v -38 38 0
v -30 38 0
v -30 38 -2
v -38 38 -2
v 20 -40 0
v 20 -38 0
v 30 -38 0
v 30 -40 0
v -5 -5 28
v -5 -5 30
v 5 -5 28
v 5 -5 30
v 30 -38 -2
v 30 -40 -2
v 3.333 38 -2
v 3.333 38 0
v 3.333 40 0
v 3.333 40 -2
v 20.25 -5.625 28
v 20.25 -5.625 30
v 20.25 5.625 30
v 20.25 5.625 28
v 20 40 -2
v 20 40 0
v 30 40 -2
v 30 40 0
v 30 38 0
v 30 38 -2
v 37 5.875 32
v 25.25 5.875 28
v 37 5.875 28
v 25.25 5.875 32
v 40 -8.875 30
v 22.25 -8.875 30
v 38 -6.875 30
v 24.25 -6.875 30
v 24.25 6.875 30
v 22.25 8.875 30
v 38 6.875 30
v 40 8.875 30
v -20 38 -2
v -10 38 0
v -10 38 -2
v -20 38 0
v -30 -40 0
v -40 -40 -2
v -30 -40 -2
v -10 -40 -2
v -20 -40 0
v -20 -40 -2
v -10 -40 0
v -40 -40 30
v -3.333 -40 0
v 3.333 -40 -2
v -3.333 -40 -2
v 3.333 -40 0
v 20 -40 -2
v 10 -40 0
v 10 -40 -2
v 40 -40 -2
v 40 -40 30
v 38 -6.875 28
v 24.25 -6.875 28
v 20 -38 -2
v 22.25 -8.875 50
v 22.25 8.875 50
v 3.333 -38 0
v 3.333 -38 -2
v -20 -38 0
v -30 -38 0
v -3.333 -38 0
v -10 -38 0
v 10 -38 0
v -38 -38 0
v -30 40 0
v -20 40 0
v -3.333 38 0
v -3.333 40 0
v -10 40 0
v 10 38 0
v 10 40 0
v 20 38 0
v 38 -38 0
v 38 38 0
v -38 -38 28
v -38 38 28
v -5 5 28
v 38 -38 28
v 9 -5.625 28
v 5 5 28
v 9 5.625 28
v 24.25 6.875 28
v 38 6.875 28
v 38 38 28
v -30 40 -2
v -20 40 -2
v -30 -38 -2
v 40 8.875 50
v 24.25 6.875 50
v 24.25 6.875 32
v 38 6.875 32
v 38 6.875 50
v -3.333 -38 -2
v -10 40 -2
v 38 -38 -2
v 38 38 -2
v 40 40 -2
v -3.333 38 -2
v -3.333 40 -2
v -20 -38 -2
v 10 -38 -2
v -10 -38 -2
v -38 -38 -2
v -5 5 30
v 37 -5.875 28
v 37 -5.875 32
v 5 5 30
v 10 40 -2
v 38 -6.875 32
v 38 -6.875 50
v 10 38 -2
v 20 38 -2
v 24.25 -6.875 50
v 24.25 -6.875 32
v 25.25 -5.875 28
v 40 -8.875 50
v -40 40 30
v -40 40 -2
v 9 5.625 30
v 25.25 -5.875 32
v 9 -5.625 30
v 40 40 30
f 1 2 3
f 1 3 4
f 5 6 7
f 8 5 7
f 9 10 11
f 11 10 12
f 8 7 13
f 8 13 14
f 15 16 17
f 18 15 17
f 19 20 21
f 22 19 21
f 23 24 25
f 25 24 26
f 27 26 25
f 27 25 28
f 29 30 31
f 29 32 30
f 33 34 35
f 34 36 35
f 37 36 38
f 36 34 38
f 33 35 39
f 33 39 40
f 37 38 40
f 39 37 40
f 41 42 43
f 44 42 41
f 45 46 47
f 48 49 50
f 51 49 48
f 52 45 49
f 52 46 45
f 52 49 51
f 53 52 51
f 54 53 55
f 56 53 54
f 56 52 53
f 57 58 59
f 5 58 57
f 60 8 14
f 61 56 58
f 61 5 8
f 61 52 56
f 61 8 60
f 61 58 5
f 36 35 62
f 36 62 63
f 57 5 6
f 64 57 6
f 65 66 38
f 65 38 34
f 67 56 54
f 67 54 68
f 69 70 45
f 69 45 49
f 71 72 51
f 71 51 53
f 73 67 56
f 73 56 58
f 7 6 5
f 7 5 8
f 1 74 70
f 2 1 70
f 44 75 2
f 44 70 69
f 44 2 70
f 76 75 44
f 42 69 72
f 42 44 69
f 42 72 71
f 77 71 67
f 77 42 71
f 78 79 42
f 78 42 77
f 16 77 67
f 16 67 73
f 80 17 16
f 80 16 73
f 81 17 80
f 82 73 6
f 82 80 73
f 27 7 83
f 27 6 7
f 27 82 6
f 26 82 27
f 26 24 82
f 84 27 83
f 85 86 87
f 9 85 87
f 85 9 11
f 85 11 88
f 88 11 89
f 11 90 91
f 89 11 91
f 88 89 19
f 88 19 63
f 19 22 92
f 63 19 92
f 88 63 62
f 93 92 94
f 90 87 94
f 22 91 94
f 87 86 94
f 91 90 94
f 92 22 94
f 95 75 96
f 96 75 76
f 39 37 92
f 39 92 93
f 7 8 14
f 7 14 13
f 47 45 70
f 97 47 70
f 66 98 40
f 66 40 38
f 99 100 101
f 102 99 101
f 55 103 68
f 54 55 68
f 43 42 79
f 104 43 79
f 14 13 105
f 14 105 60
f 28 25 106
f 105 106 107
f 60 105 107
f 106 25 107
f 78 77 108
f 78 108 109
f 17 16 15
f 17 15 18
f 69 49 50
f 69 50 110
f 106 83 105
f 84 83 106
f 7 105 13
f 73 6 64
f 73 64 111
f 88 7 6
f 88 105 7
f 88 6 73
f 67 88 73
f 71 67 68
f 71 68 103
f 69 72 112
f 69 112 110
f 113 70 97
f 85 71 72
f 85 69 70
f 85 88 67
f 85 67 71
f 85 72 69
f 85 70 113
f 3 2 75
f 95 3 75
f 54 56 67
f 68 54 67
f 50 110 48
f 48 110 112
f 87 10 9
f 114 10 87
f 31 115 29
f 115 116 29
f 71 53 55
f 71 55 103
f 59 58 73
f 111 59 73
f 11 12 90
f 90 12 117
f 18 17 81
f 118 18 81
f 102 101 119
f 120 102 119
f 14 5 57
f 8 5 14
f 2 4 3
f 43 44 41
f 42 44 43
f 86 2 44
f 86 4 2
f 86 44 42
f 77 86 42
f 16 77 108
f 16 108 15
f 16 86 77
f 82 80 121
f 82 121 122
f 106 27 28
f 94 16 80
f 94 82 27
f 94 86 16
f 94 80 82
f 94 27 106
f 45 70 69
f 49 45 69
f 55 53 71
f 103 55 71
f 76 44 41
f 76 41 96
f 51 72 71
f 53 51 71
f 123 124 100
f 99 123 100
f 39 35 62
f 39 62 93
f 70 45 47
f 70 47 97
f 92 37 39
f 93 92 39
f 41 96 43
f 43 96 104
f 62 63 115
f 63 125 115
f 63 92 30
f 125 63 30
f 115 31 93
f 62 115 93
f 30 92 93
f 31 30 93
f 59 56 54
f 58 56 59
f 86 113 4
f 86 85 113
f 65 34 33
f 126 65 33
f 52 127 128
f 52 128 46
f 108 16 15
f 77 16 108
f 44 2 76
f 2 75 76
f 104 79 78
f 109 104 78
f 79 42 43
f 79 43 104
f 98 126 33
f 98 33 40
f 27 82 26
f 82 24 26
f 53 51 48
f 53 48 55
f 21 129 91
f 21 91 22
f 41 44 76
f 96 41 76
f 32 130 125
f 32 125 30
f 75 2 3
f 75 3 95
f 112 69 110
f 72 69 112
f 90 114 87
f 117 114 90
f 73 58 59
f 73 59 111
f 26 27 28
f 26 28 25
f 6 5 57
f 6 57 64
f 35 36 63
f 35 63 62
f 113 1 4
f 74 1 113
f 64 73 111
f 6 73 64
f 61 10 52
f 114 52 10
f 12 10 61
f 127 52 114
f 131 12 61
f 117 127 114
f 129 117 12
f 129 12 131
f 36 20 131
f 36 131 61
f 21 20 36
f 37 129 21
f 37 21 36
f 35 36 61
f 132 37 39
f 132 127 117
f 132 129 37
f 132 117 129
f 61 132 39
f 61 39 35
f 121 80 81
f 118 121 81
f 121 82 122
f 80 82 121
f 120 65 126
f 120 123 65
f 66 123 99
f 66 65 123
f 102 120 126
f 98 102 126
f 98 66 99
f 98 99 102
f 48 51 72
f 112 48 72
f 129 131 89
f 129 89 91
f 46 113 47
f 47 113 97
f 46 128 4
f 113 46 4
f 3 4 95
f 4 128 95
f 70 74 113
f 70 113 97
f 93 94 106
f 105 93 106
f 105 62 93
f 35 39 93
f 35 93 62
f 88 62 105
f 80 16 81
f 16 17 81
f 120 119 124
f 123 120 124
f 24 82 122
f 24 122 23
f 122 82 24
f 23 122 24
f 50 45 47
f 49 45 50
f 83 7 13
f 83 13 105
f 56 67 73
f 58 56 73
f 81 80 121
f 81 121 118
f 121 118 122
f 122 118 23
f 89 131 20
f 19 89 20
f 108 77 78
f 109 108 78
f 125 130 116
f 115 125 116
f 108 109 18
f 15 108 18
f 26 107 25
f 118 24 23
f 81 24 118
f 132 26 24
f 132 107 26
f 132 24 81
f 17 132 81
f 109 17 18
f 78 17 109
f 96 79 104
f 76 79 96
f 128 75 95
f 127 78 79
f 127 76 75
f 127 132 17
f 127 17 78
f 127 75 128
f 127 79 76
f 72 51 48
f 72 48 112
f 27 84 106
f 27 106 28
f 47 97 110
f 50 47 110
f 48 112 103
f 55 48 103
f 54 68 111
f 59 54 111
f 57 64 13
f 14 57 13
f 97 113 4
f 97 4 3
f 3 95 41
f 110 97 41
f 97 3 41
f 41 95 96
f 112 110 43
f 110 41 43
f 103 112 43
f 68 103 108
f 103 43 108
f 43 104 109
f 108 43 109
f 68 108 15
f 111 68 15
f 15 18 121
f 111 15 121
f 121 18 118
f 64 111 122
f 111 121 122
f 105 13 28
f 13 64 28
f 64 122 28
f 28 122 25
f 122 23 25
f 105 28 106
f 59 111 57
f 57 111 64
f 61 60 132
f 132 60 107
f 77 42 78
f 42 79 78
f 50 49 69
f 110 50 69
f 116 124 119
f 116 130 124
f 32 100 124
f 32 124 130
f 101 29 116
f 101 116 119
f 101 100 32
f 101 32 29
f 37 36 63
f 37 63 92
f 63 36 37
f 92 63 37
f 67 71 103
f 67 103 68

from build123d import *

# Parameters (mm, degrees)
F0_W     = 10
F0_H     = 2
F0_W_2   = 6.66666666
F0_W_3   = 6.66667334
F0_W_4   = 6.66666
F0_W_5   = 6.666666666
F0_W_6   = 6.666666674
F1_DEPTH = 30
F2_W     = 10
F2_H     = 10
F2_W_2   = 11.25
F2_H_2   = 11.25
F3_DEPTH = 2
F4_DEPTH = 20
F5_DEPTH = 2
F2_W_3   = 13.75
F2_H_3   = 13.75
F2_W_4   = 11.75
F2_H_4   = 11.75
F6_DEPTH = 2
F7_DEPTH = 2


# Not quite as in the source:
# - a feature names something its author has since deleted; it is built from what else it names


with BuildPart() as f1:
    # F0 (on Top) → F1 (new body)
    with BuildSketch(Plane.XY):
        Polygon((30, 38), (38, 38), (38, -38), (30, -38), (30, -40), (40, -40), (40, -38), (40, 40), (30, 40), align=None)
        Polygon((-38, 38), (-30, 38), (-30, 40), (-40, 40), (-40, -40), (-30, -40), (-30, -38), (-38, -38), align=None)
        with Locations((-25, 39)):
            Rectangle(F0_W, F0_H)
        with Locations((-15, 39)):
            Rectangle(F0_W, F0_H)
        with Locations((-6.66666667, 39)):
            Rectangle(F0_W_2, F0_H)
        with Locations((15, 39)):
            Rectangle(F0_W, F0_H)
        with Locations((25, 39)):
            Rectangle(F0_W, F0_H)
        with Locations((25, -39)):
            Rectangle(F0_W, F0_H)
        with Locations((15, -39)):
            Rectangle(F0_W, F0_H)
        with Locations((6.66666333, -39)):
            Rectangle(F0_W_3, F0_H)
        with Locations((-6.66667, -39)):
            Rectangle(F0_W_4, F0_H)
        with Locations((-15, -39)):
            Rectangle(F0_W, F0_H)
        with Locations((-25, -39)):
            Rectangle(F0_W, F0_H)
        with Locations((-7e-09, 39)):
            Rectangle(F0_W_5, F0_H)
        with Locations((6.666666663, 39)):
            Rectangle(F0_W_6, F0_H)
        with Locations((-6.67e-06, -39)):
            Rectangle(F0_W_2, F0_H)
    extrude(amount=F1_DEPTH)

    # F2 (on face) → F3 (join)
    with BuildSketch(Plane.XY.offset(30)):
        Polygon((22.25, 8.875), (38, 8.875), (38, 38), (-38, 38), (-38, -38), (38, -38), (38, -8.875), (22.25, -8.875), align=None)
        Rectangle(F2_W, F2_H, mode=Mode.SUBTRACT)
        with Locations((14.625, 0)):
            Rectangle(F2_W_2, F2_H_2, mode=Mode.SUBTRACT)
        Polygon((40, -8.875), (40, 8.875), (38, 8.875), (38, 6.875), (38, -6.875), (38, -8.875), align=None)
        Polygon((38, 6.875), (38, 8.875), (22.25, 8.875), (22.25, -8.875), (38, -8.875), (38, -6.875), (24.25, -6.875), (24.25, 6.875), align=None)
    extrude(amount=-F3_DEPTH)

    # F0 (on Top) → F7 (join)
    with BuildSketch(Plane.XY):
        Polygon((-38, 38), (-30, 38), (-30, 40), (-40, 40), (-40, -40), (-30, -40), (-30, -38), (-38, -38), align=None)
        with Locations((-15, 39)):
            Rectangle(F0_W, F0_H)
        with Locations((-7e-09, 39)):
            Rectangle(F0_W_5, F0_H)
        with Locations((15, 39)):
            Rectangle(F0_W, F0_H)
        Polygon((30, 38), (38, 38), (38, -38), (30, -38), (30, -40), (40, -40), (40, -38), (40, 40), (30, 40), align=None)
        with Locations((15, -39)):
            Rectangle(F0_W, F0_H)
        with Locations((-6.67e-06, -39)):
            Rectangle(F0_W_2, F0_H)
        with Locations((-15, -39)):
            Rectangle(F0_W, F0_H)
    extrude(amount=-F7_DEPTH)


with BuildPart() as f4:
    # F2 (on face) → F4 (new body)
    with BuildSketch(Plane.XY.offset(30)):
        Polygon((40, -8.875), (40, 8.875), (38, 8.875), (38, 6.875), (38, -6.875), (38, -8.875), align=None)
        Polygon((38, 6.875), (38, 8.875), (22.25, 8.875), (22.25, -8.875), (38, -8.875), (38, -6.875), (24.25, -6.875), (24.25, 6.875), align=None)
    extrude(amount=F4_DEPTH)

    # F2 (on face) → F6 (join, symmetric)
    with BuildSketch(Plane.XY.offset(30)):
        with Locations((31.125, 0)):
            Rectangle(F2_W_3, F2_H_3)
        with Locations((31.125, 0)):
            Rectangle(F2_W_4, F2_H_4, mode=Mode.SUBTRACT)
    extrude(amount=F6_DEPTH, both=True)


with BuildPart() as f5:
    # F0 (on Top) → F5 (new body)
    with BuildSketch(Plane.XY):
        Polygon((38, -38), (38, 38), (30, 38), (20, 38), (10, 38), (3.333333326, 38), (-3.33333334, 38), (-10, 38), (-20, 38), (-30, 38), (-38, 38), (-38, -38), (-30, -38), (-20, -38), (-10, -38), (-3.33334, -38), (3.33332666, -38), (10, -38), (20, -38), (30, -38), align=None)
        with Locations((-25, 39)):
            Rectangle(F0_W, F0_H)
        with Locations((25, 39)):
            Rectangle(F0_W, F0_H)
        with Locations((-6.66667, -39)):
            Rectangle(F0_W_4, F0_H)
        with Locations((-25, -39)):
            Rectangle(F0_W, F0_H)
        with Locations((6.66666333, -39)):
            Rectangle(F0_W_3, F0_H)
        with Locations((25, -39)):
            Rectangle(F0_W, F0_H)
        with Locations((-6.66666667, 39)):
            Rectangle(F0_W_2, F0_H)
        with Locations((6.666666663, 39)):
            Rectangle(F0_W_6, F0_H)
    extrude(amount=-F5_DEPTH)


solid = Compound([f1.part, f4.part, f5.part])
